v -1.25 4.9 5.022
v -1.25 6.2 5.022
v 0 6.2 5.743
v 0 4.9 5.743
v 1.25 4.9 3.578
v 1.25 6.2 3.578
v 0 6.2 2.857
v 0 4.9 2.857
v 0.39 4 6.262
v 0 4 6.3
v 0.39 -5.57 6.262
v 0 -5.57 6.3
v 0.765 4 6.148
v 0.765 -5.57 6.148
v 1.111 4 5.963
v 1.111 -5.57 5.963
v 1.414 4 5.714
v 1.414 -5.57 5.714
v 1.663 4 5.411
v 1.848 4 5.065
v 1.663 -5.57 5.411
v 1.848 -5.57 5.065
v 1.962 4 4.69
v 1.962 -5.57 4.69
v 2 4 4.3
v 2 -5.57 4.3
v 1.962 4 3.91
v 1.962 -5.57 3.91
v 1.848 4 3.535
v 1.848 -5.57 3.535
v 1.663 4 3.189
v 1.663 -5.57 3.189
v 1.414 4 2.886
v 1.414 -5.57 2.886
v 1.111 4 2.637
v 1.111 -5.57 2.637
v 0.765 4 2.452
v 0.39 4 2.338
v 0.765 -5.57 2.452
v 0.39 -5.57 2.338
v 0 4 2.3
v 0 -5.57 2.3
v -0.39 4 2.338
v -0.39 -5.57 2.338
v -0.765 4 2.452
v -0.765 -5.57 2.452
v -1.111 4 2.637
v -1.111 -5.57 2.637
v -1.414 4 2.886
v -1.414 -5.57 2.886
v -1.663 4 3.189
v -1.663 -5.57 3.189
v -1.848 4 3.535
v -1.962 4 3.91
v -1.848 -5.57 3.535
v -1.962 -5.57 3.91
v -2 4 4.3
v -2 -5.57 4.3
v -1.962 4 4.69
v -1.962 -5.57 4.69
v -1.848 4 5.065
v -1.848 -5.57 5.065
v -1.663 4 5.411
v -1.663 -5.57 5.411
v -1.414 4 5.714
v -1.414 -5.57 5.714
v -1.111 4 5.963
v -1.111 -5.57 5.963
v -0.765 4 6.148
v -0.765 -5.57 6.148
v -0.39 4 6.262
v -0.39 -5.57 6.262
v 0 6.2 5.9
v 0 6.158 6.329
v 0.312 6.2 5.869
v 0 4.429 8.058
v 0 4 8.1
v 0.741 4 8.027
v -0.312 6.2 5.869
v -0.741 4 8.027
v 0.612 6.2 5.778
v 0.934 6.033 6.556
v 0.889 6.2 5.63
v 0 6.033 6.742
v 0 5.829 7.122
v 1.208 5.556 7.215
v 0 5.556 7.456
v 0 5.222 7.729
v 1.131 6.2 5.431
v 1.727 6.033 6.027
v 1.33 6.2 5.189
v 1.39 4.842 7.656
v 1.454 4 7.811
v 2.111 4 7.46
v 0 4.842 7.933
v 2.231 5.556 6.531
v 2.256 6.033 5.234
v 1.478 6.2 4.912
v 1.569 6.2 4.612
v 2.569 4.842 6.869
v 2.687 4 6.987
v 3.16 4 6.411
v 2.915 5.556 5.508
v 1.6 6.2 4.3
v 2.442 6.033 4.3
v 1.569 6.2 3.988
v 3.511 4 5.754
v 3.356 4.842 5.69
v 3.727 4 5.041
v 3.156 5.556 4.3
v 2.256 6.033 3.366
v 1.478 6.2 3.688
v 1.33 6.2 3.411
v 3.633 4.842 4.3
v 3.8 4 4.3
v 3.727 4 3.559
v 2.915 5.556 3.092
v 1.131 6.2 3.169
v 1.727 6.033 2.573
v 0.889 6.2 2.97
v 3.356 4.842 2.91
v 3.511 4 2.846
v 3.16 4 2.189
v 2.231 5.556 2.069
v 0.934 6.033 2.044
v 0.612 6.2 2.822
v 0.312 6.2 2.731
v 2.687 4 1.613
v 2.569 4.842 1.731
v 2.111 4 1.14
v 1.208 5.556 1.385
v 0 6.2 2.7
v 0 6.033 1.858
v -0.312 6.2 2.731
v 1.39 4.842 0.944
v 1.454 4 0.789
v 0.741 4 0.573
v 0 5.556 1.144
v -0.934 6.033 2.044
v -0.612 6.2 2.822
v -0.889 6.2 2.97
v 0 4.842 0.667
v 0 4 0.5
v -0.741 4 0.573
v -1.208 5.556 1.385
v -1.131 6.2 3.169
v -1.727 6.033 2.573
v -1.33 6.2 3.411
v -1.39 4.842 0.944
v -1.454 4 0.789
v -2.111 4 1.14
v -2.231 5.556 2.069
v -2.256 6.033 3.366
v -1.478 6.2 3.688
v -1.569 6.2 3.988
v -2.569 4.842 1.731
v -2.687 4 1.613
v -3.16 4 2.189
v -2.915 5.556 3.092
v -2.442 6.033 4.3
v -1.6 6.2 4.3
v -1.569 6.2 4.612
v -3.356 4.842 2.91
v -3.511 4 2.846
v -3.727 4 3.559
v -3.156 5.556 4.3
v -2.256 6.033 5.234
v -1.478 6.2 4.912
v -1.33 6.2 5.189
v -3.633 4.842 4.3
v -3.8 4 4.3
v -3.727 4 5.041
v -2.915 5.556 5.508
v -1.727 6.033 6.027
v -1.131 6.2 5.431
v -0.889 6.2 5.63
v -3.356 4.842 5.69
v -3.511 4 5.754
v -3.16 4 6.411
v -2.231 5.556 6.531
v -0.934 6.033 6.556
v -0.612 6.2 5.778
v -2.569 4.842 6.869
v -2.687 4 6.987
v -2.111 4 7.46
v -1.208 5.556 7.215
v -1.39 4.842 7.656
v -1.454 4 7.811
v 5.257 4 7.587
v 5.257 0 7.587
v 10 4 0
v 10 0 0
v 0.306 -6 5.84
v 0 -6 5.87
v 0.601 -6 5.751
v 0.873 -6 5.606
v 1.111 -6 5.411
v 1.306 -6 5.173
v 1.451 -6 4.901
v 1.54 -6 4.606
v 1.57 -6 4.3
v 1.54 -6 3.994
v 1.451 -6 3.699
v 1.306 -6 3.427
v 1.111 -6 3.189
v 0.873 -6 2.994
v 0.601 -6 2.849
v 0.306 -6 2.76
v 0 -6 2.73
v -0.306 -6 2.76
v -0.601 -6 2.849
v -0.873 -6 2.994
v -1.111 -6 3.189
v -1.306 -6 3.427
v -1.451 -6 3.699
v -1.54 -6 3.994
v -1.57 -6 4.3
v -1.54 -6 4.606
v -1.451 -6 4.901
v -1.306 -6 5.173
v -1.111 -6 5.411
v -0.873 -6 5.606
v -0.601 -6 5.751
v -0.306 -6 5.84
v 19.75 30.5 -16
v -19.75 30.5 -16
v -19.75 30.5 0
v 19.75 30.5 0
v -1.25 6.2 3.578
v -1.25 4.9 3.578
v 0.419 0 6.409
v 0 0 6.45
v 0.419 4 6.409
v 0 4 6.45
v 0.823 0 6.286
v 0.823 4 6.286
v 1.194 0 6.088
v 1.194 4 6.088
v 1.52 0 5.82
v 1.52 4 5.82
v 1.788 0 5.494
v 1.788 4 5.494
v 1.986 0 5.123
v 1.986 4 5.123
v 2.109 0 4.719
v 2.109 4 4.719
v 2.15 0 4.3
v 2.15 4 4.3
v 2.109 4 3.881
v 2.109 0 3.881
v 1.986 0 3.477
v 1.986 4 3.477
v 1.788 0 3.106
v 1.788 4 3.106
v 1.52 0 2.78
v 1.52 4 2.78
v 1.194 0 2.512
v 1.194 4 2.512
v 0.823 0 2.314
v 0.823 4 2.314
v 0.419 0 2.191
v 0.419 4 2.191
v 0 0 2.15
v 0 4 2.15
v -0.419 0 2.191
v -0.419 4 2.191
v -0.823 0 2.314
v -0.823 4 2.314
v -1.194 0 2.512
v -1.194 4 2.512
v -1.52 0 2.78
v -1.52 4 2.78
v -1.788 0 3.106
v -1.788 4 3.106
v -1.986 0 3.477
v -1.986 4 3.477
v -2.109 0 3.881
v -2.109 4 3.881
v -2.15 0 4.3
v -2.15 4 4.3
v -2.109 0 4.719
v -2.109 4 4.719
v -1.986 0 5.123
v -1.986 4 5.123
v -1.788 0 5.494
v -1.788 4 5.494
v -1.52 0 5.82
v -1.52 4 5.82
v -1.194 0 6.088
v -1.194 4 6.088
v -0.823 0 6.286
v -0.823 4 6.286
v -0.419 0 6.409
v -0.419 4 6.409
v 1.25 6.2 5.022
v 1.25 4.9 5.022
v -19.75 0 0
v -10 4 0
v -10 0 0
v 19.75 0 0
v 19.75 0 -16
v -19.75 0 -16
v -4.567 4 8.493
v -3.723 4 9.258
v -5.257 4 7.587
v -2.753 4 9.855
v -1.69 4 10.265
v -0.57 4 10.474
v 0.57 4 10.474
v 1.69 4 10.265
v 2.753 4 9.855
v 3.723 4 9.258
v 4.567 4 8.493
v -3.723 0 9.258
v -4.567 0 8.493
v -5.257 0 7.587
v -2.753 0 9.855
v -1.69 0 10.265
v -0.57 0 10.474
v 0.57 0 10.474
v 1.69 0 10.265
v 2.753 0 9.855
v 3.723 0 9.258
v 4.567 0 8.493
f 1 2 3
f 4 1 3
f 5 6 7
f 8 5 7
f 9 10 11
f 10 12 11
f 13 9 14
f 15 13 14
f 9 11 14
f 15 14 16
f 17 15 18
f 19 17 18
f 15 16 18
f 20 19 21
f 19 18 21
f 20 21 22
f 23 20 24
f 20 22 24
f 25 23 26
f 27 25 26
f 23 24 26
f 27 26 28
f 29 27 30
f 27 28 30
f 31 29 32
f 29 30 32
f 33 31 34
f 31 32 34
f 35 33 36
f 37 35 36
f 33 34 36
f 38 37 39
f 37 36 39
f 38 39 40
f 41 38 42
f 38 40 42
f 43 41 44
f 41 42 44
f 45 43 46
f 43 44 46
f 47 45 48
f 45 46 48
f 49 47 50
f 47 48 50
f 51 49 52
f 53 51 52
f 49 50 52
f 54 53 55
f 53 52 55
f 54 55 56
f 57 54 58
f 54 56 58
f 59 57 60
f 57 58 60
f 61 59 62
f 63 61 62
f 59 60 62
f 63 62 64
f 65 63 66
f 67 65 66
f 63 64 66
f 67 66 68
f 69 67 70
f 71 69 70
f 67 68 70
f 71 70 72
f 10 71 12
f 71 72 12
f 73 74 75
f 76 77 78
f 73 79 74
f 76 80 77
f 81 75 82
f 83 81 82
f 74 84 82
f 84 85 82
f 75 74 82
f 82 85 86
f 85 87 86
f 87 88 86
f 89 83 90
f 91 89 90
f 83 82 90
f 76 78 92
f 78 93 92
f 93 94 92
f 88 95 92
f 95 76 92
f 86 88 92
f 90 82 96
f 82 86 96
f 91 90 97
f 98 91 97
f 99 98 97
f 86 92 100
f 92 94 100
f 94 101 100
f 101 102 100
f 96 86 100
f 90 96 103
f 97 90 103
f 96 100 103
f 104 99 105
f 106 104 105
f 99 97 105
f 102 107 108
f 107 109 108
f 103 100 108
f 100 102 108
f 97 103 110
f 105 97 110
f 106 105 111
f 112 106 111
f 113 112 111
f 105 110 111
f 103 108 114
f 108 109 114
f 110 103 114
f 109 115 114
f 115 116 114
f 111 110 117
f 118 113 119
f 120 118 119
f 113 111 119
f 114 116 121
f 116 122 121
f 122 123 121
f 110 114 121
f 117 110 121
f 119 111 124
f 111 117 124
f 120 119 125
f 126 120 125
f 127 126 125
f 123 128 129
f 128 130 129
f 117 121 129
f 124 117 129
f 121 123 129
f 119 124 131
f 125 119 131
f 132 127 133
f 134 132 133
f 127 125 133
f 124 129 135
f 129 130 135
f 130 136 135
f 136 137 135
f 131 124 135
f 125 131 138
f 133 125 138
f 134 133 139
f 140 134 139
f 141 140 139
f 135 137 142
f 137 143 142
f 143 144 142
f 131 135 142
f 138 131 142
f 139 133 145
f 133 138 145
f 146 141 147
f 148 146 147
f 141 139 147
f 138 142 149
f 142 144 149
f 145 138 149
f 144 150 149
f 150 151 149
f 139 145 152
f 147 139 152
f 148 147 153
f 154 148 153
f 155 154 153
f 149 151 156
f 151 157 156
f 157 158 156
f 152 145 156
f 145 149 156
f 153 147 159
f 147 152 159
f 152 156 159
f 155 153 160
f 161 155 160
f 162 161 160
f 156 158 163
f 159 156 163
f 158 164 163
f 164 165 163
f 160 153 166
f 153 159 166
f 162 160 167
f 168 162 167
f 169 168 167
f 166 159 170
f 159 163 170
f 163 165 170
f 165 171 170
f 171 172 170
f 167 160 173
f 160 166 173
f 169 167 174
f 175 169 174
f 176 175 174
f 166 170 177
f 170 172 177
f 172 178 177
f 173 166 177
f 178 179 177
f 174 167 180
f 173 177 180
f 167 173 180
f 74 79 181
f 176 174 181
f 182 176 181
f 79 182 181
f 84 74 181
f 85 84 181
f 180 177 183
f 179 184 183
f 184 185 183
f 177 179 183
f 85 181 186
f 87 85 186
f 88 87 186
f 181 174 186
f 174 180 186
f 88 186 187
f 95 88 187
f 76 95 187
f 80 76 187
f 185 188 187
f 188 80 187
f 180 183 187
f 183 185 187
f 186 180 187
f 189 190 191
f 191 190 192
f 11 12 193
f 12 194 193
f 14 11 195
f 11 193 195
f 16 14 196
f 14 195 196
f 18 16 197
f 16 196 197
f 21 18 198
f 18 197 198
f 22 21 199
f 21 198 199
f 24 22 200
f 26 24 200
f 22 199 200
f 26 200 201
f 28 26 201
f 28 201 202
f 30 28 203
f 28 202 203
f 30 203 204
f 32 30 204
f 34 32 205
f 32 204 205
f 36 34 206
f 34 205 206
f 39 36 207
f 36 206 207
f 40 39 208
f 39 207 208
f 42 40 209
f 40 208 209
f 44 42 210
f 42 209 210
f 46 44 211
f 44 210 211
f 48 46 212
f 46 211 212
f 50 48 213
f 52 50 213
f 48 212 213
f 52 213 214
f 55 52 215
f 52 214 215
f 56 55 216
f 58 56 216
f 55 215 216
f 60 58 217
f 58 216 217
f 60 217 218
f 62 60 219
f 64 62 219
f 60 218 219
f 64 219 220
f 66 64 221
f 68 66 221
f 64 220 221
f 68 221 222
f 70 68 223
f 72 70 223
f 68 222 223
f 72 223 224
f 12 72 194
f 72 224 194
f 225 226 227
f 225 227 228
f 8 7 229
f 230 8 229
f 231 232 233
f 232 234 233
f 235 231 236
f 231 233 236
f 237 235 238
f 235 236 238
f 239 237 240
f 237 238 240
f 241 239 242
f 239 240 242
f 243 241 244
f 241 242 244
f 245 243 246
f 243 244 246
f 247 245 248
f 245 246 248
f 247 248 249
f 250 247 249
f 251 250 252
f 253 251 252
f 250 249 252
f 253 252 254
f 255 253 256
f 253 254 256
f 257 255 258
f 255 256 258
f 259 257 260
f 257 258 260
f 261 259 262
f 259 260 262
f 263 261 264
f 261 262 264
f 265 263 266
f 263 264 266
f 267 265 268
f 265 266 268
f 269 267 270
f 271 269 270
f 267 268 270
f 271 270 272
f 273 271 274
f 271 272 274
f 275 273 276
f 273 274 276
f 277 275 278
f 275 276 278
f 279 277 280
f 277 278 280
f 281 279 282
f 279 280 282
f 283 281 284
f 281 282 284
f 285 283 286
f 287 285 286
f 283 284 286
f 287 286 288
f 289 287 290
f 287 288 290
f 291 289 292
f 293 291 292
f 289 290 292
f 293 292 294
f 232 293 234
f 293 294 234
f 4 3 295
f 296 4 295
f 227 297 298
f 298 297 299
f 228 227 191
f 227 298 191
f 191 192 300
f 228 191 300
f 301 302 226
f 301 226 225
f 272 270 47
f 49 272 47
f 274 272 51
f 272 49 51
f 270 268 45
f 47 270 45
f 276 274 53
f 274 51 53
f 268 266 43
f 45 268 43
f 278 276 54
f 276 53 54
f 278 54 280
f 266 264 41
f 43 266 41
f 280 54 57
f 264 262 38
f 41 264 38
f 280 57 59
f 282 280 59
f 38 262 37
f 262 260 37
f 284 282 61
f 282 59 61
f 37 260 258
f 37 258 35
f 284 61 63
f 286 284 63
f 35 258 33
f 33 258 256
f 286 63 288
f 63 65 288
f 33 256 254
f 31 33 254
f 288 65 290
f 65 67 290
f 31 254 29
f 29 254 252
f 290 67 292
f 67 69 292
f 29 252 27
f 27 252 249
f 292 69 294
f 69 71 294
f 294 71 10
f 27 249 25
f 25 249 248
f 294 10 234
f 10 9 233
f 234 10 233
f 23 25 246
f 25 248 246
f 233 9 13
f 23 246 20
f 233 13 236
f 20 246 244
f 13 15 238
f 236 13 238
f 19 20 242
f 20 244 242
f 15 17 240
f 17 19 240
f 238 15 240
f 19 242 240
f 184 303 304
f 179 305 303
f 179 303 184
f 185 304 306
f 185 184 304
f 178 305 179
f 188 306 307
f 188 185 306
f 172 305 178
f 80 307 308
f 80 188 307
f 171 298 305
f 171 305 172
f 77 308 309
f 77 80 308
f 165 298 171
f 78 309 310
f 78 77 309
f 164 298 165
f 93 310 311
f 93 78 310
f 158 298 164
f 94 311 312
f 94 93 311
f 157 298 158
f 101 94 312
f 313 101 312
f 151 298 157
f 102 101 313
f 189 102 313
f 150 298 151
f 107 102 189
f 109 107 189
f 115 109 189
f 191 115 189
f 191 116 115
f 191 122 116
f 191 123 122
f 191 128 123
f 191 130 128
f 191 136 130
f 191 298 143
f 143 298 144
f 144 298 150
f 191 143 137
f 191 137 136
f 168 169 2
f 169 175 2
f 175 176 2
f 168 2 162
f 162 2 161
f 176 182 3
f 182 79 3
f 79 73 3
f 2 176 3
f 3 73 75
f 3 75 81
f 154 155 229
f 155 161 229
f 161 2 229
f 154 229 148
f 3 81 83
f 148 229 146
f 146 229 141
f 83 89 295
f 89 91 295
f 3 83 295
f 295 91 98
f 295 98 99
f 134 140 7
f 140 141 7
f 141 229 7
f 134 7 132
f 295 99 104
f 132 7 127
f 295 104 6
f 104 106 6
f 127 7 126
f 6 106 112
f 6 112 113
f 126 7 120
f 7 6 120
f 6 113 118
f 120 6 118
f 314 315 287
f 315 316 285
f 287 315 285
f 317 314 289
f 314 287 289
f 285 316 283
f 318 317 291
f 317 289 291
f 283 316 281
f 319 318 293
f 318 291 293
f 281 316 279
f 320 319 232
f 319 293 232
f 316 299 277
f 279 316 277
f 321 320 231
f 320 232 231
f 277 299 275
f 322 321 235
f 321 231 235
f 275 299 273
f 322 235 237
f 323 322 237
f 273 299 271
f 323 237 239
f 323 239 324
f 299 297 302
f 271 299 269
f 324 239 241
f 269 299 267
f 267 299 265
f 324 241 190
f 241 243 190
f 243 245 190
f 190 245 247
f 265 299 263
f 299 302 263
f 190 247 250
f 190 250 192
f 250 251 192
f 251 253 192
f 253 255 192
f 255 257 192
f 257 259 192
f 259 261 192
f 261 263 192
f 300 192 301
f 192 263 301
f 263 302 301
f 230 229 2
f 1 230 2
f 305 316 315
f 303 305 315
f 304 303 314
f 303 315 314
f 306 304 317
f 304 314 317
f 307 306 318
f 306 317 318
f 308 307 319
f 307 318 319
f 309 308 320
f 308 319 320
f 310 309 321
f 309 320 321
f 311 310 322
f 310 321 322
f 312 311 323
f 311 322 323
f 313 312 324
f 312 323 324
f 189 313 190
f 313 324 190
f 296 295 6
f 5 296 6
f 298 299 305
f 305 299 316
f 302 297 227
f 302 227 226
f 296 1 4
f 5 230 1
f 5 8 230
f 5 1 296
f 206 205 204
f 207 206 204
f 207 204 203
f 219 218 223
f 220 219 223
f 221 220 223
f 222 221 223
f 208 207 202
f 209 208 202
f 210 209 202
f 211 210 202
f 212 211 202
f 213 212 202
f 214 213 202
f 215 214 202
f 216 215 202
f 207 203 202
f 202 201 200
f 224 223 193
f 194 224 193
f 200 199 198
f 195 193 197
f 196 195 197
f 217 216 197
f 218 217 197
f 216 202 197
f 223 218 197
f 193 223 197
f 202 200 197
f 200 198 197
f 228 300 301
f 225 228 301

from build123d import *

# Parameters (mm, degrees)
SKETCH_1_W          = 39.5
SKETCH_1_H          = 16
EXTRUDE_1_DEPTH     = 30.5
EXTRUDE_2_DEPTH     = 4
SKETCH_3_W          = 2.15
SKETCH_3_H          = 4
CUT_EXTRUDE_1_DEPTH = 1.3


with BuildPart() as part:
    # 草图1 → 凸台-拉伸1 (new body)
    with BuildSketch(Plane(origin=(0, 0, 0), x_dir=(1, 0, 0), z_dir=(0, 1, 0))):
        with Locations((0, 8)):
            Rectangle(SKETCH_1_W, SKETCH_1_H)
    extrude(amount=EXTRUDE_1_DEPTH)

    # 草图2 → 凸台-拉伸2 (add)
    with BuildSketch(Plane(origin=(0, 0, 0), x_dir=(1, 0, 0), z_dir=(0, 1, 0))):
        with BuildLine():
            Line((-10, 0), (-5.257226723, -7.586573775))
            ThreePointArc((-5.257226723, -7.586573775), (0, -10.5), (5.257226723, -7.586573775))
            Line((5.257226723, -7.586573775), (10, 0))
            Line((10, 0), (-10, 0))
        make_face()
    extrude(amount=EXTRUDE_2_DEPTH)

    # 草图3 → 切除-旋转1 (revolve, cut)
    with BuildSketch(Plane.XY.offset(4.3)):
        with Locations((1.075, 2)):
            Rectangle(SKETCH_3_W, SKETCH_3_H)
    revolve(axis=Axis((0, 0, 4.3), (0, 1, 0)), mode=Mode.SUBTRACT)

    # 草图4 → 旋转1 (revolve)
    with BuildSketch(Plane.XY.offset(4.3)):
        with BuildLine():
            Line((0, 6.2), (1.6, 6.2))
            ThreePointArc((1.6, 6.2), (3.155634919, 5.555634919), (3.8, 4))
            Line((3.8, 4), (2, 4))
            Line((2, 4), (2, -5.5705))
            Line((2, -5.5705), (1.5705, -6))
            Line((1.5705, -6), (0, -6))
            Line((0, -6), (0, 6.2))
        make_face()
    revolve(axis=Axis((0, -6, 4.3), (0, 1, 0)))

    # 草图5 → 切除-拉伸1 (cut)
    with BuildSketch(Plane(origin=(0, 6.2, 0), x_dir=(1, 0, 0), z_dir=(0, 1, 0))):
        Polygon((-1.25, -3.578312164), (-1.25, -5.021687836), (0, -5.743375673), (1.25, -5.021687836), (1.25, -3.578312164), (0, -2.856624327), align=None)
    extrude(amount=-CUT_EXTRUDE_1_DEPTH, mode=Mode.SUBTRACT)


solid = part.part
